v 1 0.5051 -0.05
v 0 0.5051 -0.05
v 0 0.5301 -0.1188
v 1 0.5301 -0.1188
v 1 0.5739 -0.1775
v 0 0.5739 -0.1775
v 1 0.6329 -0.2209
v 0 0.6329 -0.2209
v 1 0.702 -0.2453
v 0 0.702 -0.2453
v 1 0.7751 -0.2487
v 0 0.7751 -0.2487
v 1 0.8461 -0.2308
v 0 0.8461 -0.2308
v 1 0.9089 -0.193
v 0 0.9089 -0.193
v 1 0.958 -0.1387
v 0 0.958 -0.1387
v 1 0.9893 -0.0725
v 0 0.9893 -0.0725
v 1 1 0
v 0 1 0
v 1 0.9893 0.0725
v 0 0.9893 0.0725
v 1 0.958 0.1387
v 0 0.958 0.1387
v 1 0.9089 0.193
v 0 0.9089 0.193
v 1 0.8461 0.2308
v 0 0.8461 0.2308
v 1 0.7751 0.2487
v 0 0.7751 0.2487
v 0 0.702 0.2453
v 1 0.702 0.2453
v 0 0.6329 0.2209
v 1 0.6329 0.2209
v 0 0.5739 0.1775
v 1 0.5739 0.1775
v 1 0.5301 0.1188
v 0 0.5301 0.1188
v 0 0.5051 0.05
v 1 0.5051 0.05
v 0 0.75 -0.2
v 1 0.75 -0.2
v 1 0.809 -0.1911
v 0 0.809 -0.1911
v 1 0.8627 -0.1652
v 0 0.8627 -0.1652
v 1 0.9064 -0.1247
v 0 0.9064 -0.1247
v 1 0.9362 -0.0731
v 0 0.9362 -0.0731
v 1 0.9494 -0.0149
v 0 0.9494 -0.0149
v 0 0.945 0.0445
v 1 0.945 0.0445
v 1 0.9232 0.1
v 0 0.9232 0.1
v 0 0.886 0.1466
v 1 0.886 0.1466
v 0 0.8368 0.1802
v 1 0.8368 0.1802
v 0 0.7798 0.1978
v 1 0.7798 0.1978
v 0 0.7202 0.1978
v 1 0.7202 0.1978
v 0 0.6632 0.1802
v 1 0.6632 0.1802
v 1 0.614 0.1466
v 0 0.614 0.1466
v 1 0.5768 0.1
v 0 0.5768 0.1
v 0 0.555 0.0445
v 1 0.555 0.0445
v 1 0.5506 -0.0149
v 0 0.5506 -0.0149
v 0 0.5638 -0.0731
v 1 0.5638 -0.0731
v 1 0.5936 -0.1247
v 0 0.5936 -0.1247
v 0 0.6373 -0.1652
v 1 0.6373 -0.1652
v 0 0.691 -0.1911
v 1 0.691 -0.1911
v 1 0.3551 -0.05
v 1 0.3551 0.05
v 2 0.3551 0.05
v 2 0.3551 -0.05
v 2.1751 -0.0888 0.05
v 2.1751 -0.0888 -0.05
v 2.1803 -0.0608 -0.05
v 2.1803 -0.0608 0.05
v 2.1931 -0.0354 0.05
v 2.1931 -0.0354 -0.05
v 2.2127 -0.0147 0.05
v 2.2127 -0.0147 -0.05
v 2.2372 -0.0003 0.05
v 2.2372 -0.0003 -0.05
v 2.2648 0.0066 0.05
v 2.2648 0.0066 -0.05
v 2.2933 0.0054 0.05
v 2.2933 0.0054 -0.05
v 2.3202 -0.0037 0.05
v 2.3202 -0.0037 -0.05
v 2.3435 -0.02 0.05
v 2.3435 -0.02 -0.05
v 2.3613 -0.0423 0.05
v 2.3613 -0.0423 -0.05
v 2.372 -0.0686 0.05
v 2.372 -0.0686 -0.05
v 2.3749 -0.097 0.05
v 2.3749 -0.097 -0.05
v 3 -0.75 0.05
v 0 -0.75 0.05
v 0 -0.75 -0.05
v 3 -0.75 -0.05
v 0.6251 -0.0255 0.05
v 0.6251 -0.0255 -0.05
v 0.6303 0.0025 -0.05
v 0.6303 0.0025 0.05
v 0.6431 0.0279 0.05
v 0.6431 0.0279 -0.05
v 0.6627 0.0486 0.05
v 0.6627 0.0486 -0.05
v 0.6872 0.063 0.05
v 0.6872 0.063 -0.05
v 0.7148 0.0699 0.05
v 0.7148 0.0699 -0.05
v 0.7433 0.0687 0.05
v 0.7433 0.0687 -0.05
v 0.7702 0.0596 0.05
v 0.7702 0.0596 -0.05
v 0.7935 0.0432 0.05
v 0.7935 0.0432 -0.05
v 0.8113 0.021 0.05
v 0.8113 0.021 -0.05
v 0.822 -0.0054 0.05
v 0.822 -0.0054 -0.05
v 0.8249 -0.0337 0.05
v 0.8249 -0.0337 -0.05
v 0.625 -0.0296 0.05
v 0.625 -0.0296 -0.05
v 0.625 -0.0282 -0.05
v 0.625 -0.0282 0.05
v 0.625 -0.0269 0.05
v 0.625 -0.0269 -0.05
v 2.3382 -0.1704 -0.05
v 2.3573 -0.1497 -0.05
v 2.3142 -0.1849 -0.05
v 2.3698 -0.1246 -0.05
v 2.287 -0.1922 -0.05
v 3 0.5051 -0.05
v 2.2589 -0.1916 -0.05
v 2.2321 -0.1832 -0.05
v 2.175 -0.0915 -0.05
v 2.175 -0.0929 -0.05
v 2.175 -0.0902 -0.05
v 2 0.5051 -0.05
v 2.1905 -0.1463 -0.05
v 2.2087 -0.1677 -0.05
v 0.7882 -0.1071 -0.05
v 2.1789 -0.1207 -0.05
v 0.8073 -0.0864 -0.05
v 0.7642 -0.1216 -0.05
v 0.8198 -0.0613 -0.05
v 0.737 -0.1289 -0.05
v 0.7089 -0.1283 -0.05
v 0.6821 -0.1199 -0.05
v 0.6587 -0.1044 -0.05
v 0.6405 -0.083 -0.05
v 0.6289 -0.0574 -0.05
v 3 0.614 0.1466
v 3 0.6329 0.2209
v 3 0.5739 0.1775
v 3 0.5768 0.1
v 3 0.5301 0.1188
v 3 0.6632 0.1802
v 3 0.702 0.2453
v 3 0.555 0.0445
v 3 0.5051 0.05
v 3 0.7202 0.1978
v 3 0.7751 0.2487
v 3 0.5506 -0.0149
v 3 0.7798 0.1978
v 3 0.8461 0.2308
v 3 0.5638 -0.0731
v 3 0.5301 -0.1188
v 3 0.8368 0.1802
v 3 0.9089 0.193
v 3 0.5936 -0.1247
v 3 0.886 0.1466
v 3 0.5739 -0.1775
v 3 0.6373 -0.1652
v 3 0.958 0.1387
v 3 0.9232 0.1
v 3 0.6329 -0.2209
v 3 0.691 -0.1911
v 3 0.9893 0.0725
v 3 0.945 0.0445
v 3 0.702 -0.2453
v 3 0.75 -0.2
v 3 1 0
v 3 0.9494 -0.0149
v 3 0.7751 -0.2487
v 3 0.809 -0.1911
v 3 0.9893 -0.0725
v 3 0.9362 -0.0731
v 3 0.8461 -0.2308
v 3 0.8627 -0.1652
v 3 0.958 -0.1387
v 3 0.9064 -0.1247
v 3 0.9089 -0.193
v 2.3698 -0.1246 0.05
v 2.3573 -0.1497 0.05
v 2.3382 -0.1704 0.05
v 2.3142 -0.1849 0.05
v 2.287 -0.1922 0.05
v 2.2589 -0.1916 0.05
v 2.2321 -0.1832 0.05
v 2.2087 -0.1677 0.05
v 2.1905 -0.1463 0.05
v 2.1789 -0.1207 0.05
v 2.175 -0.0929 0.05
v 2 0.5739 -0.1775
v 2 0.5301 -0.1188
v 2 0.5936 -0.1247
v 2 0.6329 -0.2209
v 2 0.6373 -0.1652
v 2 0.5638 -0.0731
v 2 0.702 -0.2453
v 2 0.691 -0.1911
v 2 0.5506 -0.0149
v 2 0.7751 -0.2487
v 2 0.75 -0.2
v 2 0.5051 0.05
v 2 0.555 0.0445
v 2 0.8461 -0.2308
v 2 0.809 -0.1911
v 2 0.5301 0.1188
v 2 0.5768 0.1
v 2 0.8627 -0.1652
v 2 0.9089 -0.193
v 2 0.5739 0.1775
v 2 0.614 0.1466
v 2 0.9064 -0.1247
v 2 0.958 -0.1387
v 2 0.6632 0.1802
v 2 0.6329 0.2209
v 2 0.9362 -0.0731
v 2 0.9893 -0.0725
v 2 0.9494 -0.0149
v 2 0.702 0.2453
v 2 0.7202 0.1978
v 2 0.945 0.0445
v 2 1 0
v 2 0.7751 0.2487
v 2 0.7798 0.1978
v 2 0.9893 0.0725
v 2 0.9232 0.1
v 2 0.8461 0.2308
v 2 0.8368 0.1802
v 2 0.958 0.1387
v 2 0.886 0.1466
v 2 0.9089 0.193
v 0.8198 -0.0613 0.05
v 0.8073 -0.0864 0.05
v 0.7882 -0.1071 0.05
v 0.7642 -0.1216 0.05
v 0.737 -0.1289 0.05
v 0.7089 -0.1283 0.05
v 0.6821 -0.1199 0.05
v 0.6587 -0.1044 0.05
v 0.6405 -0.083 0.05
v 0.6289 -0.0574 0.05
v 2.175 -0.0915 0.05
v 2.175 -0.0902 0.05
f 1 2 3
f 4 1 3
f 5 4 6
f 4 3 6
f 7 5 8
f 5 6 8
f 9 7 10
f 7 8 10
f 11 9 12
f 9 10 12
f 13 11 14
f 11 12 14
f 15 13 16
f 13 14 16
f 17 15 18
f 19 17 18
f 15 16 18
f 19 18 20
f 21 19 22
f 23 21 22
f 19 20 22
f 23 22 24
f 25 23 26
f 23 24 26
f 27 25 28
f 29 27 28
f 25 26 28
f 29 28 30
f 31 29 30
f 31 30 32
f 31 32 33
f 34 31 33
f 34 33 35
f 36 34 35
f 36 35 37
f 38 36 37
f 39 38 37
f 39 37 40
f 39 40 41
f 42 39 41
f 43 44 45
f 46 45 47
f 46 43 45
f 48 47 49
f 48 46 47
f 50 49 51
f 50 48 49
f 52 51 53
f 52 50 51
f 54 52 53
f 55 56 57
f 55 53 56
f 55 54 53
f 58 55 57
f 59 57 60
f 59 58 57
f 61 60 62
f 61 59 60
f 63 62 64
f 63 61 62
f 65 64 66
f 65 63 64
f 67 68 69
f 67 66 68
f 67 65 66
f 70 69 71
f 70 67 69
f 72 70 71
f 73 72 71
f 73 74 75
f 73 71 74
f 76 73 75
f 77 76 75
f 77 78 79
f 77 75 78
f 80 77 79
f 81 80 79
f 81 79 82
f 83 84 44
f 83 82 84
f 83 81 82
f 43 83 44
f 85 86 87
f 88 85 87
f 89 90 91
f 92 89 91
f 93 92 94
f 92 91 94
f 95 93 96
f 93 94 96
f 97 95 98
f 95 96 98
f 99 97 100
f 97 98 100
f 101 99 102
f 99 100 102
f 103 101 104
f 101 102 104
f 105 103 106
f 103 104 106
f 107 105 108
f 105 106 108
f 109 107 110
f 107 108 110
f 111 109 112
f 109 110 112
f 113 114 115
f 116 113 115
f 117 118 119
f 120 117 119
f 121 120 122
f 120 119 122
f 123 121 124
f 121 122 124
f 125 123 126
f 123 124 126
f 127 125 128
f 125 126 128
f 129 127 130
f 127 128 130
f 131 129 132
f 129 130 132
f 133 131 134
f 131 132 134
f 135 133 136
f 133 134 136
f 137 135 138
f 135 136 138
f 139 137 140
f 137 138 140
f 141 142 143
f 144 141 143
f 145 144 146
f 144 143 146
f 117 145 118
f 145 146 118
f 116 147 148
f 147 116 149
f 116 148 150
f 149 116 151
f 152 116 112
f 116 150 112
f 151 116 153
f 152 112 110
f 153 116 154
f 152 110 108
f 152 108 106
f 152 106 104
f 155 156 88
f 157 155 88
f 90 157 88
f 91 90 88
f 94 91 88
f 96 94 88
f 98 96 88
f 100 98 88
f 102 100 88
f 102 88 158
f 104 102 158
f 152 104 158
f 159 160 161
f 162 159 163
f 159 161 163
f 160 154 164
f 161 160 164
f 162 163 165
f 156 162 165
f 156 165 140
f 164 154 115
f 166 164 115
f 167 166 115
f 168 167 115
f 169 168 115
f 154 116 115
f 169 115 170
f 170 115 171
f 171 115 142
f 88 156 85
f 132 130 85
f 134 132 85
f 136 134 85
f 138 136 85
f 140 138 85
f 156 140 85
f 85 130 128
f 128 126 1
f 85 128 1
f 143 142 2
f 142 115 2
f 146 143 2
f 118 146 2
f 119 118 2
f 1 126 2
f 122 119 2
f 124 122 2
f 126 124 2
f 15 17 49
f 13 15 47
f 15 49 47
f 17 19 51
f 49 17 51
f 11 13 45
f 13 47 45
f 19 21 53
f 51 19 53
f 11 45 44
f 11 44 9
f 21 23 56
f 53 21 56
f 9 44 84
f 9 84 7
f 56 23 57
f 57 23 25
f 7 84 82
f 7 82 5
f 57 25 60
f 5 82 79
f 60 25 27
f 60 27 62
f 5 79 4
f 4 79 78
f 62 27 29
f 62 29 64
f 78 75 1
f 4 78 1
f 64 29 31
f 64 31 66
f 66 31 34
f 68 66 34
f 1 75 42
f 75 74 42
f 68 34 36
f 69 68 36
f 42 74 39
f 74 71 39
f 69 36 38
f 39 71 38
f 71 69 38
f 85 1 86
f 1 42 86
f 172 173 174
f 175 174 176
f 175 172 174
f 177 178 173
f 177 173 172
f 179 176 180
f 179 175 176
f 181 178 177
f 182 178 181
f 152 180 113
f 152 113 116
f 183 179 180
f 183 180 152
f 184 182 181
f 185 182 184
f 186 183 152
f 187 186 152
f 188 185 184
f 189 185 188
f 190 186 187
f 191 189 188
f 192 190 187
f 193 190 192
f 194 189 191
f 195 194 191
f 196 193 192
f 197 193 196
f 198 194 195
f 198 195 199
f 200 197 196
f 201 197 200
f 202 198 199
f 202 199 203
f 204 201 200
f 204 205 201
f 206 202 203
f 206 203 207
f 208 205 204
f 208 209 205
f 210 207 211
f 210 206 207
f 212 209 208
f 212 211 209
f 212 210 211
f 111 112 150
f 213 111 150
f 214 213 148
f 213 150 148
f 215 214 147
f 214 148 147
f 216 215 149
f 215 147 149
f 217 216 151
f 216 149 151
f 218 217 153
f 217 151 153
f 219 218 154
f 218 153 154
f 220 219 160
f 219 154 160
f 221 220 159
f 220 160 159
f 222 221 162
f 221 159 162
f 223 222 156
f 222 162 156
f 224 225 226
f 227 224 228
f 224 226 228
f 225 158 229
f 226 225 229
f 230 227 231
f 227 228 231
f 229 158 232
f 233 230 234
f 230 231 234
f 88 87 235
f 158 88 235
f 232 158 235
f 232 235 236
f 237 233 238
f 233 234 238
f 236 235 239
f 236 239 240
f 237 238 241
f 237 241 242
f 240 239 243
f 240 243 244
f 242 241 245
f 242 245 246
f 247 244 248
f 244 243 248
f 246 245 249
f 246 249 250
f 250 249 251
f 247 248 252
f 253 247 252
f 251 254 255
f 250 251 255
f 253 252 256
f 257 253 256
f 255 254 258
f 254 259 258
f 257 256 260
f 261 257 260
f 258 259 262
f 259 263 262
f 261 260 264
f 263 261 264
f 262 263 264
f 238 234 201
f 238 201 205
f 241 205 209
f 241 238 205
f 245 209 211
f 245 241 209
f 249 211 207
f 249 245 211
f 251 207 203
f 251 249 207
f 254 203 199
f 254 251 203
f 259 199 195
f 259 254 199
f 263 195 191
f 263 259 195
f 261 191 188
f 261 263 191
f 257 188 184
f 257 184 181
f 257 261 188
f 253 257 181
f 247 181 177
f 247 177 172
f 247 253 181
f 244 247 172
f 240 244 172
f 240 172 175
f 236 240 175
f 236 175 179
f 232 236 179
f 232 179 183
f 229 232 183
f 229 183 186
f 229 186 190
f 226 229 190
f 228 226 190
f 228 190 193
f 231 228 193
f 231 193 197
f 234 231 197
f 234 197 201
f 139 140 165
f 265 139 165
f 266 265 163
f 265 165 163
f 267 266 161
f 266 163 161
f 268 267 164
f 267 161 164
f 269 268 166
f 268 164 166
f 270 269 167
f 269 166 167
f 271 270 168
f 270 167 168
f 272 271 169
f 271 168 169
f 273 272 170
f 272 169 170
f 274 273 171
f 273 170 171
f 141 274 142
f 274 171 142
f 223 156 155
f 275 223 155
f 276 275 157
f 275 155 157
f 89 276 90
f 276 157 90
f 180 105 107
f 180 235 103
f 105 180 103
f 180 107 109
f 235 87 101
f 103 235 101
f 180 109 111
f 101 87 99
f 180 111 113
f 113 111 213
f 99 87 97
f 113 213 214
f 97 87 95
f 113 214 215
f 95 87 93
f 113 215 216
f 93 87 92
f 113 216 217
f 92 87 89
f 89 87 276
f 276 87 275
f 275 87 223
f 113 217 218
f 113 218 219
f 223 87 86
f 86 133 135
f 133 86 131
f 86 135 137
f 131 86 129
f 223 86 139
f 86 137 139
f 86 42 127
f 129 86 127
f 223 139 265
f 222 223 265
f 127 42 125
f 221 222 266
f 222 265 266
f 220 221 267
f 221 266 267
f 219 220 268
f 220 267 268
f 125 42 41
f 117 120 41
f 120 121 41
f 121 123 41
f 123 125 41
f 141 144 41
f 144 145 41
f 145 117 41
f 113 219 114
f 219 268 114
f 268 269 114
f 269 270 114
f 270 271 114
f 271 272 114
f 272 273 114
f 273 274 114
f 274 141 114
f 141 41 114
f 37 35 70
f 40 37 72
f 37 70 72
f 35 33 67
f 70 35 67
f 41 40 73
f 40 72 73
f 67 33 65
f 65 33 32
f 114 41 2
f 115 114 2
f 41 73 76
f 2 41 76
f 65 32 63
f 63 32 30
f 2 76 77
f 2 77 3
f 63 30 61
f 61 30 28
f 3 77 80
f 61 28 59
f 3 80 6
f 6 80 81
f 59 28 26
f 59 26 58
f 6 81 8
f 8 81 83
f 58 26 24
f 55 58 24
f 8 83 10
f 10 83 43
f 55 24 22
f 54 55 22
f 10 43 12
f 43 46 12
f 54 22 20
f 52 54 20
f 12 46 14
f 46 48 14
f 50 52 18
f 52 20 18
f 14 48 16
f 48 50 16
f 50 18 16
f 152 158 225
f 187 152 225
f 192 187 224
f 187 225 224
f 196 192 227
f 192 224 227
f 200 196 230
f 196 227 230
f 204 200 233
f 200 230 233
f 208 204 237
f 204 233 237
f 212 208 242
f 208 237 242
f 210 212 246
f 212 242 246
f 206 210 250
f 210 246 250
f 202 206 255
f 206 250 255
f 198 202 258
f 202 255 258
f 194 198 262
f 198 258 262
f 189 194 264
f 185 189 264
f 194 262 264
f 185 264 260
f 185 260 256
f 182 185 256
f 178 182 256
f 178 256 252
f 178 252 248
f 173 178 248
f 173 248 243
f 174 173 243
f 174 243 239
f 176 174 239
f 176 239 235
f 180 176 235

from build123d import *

# Parameters (mm, degrees)
SKETCH_2_R               = 0.2
EXTRUDE_1_DEPTH          = 3
SKETCH_3_R               = 0.1
CUT_EXTRUDE_1_DEPTH      = 3
CUT_EXTRUDE_2_DEPTH      = 3
CUT_EXTRUDE_2_DEPTH_BACK = 3
SKETCH_4_W               = 1
SKETCH_4_H               = 1.358219005


with BuildPart() as part:
    # 草图2 → 凸台-拉伸1 (new body)
    with BuildSketch(Plane(origin=(0, 0, 0), x_dir=(0, 0, -1), z_dir=(1, 0, 0))):
        with BuildLine():
            Line((-0.05, 0.505051026), (-0.05, -0.75))
            Line((-0.05, -0.75), (0.05, -0.75))
            Line((0.05, -0.75), (0.05, 0.505051026))
            ThreePointArc((0.05, 0.505051026), (0, 1), (-0.05, 0.505051026))
        make_face()
        with Locations((0, 0.75)):
            Circle(SKETCH_2_R, mode=Mode.SUBTRACT)
    extrude(amount=EXTRUDE_1_DEPTH)

    # 草图3 → 切除-拉伸1 (cut)
    with BuildSketch(Plane(origin=(0, 0, -0.05), x_dir=(-1, 0, 0), z_dir=(0, 0, -1))):
        with Locations((-2.275, -0.092876486)):
            Circle(SKETCH_3_R)
        with Locations((-0.725, -0.029598001)):
            Circle(SKETCH_3_R)
    extrude(amount=-CUT_EXTRUDE_1_DEPTH, mode=Mode.SUBTRACT)

    # 草图4 → 切除-拉伸2 (cut, two sides: drawn at the far end of the back side and taken through both)
    with BuildSketch(Plane.XY.offset(0.05).offset(-CUT_EXTRUDE_2_DEPTH_BACK)):
        with Locations((1.5, 1.034160529)):
            Rectangle(SKETCH_4_W, SKETCH_4_H)
    extrude(amount=CUT_EXTRUDE_2_DEPTH + CUT_EXTRUDE_2_DEPTH_BACK, mode=Mode.SUBTRACT)


solid = part.part
